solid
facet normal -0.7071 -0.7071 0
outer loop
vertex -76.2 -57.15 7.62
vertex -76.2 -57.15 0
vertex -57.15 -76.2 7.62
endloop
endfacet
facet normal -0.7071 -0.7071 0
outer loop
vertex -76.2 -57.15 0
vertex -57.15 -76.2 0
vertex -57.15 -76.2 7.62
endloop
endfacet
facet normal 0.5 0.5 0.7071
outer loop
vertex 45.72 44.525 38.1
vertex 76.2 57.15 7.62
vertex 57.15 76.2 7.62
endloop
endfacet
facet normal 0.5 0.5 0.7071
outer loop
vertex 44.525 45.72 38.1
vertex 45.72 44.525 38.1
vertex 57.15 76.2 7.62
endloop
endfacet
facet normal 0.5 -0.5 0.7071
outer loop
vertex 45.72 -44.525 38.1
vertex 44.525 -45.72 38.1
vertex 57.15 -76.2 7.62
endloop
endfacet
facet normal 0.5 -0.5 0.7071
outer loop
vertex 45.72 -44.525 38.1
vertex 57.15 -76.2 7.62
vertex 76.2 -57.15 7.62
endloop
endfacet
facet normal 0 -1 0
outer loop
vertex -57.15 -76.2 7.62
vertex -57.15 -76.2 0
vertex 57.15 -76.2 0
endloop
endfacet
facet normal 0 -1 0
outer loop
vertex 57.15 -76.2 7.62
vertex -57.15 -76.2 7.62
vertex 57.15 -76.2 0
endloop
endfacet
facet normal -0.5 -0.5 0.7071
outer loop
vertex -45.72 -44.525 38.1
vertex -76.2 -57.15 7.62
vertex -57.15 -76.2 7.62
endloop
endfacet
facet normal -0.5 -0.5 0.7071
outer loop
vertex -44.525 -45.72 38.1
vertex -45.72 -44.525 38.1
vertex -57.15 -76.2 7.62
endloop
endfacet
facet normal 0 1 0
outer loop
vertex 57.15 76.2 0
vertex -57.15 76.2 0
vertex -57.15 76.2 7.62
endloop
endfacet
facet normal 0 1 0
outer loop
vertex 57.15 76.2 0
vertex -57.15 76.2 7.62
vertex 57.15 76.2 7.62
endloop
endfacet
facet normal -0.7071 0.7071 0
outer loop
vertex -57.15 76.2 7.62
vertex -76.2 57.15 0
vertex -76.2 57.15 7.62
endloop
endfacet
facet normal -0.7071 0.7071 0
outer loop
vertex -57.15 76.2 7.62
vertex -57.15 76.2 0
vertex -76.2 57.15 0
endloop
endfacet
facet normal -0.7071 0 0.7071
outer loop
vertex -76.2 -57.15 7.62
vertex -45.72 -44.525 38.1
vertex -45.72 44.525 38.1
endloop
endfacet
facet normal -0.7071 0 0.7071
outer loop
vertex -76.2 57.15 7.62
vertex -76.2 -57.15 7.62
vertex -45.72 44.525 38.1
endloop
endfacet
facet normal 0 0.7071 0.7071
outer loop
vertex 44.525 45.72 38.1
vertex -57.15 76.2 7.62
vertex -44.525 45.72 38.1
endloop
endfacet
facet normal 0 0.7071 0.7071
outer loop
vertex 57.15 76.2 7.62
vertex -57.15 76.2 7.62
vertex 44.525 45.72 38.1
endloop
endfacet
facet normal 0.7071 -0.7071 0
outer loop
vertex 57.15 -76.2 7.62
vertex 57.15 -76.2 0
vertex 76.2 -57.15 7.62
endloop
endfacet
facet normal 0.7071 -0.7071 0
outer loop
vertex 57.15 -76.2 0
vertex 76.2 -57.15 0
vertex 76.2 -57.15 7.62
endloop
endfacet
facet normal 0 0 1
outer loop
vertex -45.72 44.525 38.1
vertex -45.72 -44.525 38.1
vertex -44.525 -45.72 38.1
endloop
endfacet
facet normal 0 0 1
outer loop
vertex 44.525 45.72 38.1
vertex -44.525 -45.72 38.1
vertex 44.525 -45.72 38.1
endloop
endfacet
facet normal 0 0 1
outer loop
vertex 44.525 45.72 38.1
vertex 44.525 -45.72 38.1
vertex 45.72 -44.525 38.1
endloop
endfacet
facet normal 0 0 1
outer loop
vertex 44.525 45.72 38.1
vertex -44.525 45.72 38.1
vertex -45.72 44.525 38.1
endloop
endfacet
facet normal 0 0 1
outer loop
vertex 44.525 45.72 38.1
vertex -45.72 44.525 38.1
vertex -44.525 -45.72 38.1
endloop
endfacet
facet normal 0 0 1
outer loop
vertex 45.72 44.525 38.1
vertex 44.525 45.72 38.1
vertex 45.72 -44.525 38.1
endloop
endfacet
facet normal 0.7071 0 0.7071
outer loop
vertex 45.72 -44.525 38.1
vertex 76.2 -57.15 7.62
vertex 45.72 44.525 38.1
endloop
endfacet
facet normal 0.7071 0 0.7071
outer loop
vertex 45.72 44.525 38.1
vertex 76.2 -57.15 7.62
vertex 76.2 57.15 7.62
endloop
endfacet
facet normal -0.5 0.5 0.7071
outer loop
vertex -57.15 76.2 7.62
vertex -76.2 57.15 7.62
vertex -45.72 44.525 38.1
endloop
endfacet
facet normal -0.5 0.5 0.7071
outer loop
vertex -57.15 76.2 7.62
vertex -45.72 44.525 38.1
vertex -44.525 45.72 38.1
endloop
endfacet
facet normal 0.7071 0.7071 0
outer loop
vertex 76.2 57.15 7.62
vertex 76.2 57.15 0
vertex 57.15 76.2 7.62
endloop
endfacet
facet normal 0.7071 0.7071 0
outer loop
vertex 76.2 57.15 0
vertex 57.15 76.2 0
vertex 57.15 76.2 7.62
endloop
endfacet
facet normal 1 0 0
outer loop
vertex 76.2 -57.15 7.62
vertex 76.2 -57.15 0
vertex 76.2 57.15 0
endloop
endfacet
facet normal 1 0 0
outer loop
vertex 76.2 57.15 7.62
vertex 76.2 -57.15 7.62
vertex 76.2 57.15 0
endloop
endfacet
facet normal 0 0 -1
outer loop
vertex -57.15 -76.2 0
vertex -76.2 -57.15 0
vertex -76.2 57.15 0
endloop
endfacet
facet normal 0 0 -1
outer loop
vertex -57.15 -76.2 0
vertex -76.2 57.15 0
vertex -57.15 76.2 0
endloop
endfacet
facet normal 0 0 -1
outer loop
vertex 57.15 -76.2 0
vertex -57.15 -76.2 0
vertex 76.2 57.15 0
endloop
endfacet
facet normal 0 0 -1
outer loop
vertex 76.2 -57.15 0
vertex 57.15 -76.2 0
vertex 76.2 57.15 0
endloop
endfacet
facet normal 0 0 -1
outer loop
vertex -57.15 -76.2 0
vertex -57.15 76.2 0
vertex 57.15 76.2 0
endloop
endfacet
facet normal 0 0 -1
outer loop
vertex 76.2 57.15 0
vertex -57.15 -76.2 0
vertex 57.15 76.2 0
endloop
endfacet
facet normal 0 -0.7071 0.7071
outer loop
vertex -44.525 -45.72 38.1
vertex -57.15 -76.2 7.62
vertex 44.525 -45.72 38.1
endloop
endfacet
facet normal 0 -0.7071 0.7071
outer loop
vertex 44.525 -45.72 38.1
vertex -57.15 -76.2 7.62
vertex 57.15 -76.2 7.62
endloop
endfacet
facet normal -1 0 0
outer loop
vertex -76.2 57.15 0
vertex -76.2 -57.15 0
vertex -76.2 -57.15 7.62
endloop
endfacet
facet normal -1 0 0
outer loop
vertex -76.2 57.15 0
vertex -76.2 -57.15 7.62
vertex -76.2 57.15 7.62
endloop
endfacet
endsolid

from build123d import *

# Parameters (mm, degrees)
F0_W     = 152.4
F0_H     = 152.4
F1_DEPTH = 38.1
F2_SIZE  = 19.05
F3_SIZE  = 30.48


with BuildPart() as f1:
    # F0 (on Top) → F1 (new body)
    with BuildSketch(Plane.XY):
        Rectangle(F0_W, F0_H)
    extrude(amount=F1_DEPTH)

    # F2
    f2_edges = [f1.edges().sort_by_distance(p)[0] for p in [
        (-76.2, -76.2, 19.05),
        (76.2, -76.2, 19.05),
        (76.2, 76.2, 19.05),
        (-76.2, 76.2, 19.05),
    ]]
    chamfer(f2_edges, length=F2_SIZE)

    # F3
    f3_edges = [f1.edges().sort_by_distance(p)[0] for p in [
        (0, -76.2, 38.1),
        (-76.2, 0, 38.1),
        (0, 76.2, 38.1),
        (76.2, 0, 38.1),
        (66.675, -66.675, 38.1),
        (66.675, 66.675, 38.1),
        (-66.675, 66.675, 38.1),
        (-66.675, -66.675, 38.1),
    ]]
    chamfer(f3_edges, length=F3_SIZE)


solid = f1.part
